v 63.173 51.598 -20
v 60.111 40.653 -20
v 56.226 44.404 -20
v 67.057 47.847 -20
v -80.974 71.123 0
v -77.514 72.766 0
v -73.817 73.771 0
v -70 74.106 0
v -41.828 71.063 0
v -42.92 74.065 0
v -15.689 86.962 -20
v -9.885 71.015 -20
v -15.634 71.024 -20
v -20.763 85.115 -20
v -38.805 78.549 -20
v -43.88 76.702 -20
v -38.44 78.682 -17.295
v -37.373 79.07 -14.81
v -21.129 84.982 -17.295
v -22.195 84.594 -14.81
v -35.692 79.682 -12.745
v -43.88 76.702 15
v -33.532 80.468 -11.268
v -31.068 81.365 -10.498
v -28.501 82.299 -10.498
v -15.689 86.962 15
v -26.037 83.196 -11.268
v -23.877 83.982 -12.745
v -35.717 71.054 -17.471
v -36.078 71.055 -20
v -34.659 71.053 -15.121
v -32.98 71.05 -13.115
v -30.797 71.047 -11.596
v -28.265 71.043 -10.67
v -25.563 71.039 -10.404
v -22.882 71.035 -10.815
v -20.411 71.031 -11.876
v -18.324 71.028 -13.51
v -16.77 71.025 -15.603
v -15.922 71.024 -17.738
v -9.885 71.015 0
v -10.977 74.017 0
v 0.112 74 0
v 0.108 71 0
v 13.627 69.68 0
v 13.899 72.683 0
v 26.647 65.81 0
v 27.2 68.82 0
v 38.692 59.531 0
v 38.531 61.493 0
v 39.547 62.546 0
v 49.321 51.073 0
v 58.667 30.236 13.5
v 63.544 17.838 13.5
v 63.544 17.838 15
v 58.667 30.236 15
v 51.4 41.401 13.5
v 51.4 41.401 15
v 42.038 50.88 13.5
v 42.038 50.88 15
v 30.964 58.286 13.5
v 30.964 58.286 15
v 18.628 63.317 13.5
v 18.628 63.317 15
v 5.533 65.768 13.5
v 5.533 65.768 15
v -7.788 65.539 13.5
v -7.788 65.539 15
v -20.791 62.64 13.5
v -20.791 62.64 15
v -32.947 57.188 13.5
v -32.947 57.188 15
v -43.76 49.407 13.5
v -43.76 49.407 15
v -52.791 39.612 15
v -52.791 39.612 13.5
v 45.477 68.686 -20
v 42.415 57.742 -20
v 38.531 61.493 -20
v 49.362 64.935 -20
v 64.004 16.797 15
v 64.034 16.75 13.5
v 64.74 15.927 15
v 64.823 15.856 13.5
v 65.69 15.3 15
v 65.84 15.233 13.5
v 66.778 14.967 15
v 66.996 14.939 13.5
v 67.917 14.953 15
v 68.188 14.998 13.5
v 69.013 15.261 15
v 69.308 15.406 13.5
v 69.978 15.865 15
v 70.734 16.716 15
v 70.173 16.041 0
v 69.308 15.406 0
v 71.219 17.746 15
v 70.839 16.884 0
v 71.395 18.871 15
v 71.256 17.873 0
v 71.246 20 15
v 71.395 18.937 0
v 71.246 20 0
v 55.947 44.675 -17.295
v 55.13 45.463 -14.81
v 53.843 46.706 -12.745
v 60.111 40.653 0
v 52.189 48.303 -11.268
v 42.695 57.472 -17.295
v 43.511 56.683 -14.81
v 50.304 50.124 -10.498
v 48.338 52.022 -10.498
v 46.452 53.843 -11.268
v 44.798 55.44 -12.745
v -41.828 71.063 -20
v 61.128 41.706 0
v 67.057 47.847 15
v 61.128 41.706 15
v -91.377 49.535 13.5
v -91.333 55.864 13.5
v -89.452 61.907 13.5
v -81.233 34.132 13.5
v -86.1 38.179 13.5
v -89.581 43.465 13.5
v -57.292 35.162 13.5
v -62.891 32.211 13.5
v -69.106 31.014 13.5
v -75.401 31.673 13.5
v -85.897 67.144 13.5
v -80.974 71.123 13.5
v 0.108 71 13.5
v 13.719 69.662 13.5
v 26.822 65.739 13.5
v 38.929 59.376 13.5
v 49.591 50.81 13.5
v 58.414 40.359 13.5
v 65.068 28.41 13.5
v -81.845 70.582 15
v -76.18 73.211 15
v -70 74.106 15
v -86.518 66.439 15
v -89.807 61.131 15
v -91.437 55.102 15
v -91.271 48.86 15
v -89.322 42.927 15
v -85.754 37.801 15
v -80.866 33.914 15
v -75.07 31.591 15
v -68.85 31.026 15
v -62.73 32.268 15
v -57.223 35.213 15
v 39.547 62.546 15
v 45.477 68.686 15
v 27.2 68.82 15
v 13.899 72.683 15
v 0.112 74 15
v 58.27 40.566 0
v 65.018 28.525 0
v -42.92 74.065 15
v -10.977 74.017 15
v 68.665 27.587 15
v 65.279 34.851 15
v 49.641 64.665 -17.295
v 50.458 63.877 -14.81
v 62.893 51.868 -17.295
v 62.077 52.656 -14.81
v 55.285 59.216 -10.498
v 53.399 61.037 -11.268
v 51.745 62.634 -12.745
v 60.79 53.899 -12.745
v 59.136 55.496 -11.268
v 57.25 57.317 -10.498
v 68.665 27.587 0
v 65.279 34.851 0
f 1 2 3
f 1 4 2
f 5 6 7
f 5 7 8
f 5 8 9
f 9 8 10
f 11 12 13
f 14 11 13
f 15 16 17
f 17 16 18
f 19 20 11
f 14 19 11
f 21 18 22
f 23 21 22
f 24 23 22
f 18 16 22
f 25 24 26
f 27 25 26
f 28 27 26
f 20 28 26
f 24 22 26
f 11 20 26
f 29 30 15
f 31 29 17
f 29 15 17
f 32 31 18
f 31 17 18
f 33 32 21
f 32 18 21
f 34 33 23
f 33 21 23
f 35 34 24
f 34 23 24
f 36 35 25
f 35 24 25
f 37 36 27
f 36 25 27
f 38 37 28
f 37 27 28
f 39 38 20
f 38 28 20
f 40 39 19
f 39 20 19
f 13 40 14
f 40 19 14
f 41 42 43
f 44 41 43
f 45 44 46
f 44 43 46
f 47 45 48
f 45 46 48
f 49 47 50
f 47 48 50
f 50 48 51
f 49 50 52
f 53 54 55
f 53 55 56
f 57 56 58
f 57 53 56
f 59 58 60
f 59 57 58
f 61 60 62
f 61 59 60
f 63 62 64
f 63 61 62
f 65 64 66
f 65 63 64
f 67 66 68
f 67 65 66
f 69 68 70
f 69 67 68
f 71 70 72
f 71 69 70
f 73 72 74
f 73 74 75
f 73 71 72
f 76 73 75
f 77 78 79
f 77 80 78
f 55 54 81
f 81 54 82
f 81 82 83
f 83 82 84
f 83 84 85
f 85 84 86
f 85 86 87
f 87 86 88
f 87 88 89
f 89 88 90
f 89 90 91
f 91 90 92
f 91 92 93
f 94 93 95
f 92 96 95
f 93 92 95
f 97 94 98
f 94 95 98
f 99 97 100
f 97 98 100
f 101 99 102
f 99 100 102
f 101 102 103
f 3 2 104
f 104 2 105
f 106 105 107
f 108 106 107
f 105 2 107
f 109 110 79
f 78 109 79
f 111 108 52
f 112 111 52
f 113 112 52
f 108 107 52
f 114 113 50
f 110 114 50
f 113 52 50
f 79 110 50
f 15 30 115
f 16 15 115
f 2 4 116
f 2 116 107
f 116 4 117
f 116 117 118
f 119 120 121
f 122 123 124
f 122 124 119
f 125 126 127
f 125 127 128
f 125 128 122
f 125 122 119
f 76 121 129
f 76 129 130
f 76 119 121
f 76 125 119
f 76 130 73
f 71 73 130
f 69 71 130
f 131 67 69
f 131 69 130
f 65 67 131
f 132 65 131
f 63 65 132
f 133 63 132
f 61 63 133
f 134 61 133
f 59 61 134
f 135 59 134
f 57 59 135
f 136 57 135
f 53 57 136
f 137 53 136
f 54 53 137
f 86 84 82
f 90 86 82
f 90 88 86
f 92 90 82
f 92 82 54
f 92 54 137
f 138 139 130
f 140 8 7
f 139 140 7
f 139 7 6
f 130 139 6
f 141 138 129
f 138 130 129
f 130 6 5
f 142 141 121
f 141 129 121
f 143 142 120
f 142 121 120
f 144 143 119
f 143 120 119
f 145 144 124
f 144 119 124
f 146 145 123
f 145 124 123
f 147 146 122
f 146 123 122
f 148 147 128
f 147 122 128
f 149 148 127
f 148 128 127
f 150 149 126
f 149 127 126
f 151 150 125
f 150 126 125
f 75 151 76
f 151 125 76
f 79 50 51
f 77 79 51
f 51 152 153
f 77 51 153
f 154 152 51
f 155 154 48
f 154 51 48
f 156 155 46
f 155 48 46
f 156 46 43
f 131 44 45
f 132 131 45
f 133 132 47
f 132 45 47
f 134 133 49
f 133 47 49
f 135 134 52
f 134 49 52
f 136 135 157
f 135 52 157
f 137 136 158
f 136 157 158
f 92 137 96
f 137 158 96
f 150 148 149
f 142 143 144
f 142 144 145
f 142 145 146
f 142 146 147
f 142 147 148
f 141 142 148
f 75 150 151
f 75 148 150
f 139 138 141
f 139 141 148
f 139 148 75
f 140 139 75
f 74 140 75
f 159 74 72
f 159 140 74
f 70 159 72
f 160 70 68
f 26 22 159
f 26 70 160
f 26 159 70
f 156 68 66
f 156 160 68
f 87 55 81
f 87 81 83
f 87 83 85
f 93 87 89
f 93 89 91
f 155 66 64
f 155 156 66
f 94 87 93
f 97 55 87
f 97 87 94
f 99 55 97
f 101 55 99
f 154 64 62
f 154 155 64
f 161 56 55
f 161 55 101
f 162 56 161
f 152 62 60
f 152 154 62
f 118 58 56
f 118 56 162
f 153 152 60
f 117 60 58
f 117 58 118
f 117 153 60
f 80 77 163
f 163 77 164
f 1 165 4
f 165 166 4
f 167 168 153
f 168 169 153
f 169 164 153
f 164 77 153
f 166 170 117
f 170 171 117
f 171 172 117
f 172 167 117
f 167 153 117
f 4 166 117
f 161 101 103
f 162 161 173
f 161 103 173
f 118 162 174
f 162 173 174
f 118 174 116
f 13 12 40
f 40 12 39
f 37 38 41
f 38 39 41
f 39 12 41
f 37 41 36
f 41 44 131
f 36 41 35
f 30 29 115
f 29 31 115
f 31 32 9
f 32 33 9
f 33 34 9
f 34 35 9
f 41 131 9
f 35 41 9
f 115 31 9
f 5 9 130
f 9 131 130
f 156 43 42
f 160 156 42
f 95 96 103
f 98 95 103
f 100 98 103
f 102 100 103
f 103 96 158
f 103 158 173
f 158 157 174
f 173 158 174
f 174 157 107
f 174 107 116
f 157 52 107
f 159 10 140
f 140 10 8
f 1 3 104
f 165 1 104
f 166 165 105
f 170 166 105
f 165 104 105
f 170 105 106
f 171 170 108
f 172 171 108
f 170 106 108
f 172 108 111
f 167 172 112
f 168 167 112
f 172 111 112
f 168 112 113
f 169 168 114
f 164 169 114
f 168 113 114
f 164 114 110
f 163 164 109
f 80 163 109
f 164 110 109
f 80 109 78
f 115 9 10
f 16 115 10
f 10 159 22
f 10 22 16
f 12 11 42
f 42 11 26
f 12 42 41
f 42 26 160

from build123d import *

# Parameters (mm, degrees)
PAD_DEPTH       = 15
SKETCH002_R     = 71
POCKET_DEPTH    = 13.5
POCKET001_DEPTH = 13.5
PAD001_DEPTH    = 35
PAD002_DEPTH    = 35
SKETCH_R        = 9.6
POCKET002_DEPTH = 41.1514534441
SKETCH009_R     = 9.6
POCKET003_DEPTH = 97.4839978397


with BuildPart() as part:
    # Sketch001 → Pad (new body)
    with BuildSketch(Plane.XY):
        with BuildLine():
            ThreePointArc((71.2460525222, 20), (44.7436533058, 58.9406946756), (0.1121090023, 73.9999150781))
            Line((0.1121090023, 73.9999150781), (-70, 74.1061334774))
            ThreePointArc((-69.9999999999, 74.1061334774), (-89.3215614177, 42.9266570301), (-52.7907882568, 39.6122793491))
            ThreePointArc((63.5437766663, 17.8378375087), (12.1424161228, 64.8734285413), (-52.7907882568, 39.6122793491))
            ThreePointArc((63.5437766663, 17.8378375087), (68.4759958054, 15.0677809492), (71.2460525222, 20))
        make_face()
    extrude(amount=PAD_DEPTH)

    # Sketch002 → Pocket (cut)
    with BuildSketch(Plane(origin=(0, 0, 0), x_dir=(1, 0, 0), z_dir=(0, 0, -1))):
        Circle(SKETCH002_R)
    extrude(amount=-POCKET_DEPTH, mode=Mode.SUBTRACT)

    # Sketch003 → Pocket001 (cut)
    with BuildSketch(Plane(origin=(0, 0, 0), x_dir=(1, 0, 0), z_dir=(0, 0, -1))):
        Polygon((-153.2491449427, -71.2322507725), (0.107679068, -70.9999183467), (-35.4631, 35.7409), align=None)
    extrude(amount=-POCKET001_DEPTH, mode=Mode.SUBTRACT)

    # Sketch005 → Pad001 (new body)
    with BuildSketch(Plane.XY.offset(15)):
        Polygon((38.5306472975, 61.493001381), (45.4772310021, 68.6863993843), (67.0574250122, 47.8466482706), (60.1108413076, 40.6532502672), align=None)
    extrude(amount=-PAD001_DEPTH)

    # Sketch006 → Pad002 (new body)
    with BuildSketch(Plane.XY.offset(15)):
        Polygon((-41.8276469497, 71.0634495008), (-43.8797678097, 76.7016052255), (-15.6889891861, 86.9622095253), (-9.8847001983, 71.0150565952), align=None)
    extrude(amount=-PAD002_DEPTH)

    # Sketch → Pocket002 (cut, through all)
    with BuildSketch(Plane(origin=(49.3207443026, 51.0731258241, 0), x_dir=(0.7193398003, -0.6946583705, 0), z_dir=(-0.6946583705, -0.7193398003, 0))):
        with Locations((0, -20)):
            Circle(SKETCH_R)
    extrude(amount=-POCKET002_DEPTH, mode=Mode.SUBTRACT)

    # Sketch009 → Pocket003 (cut, through all)
    with BuildSketch(Plane(origin=(-29.7843784979, 81.8319073754, 0), x_dir=(-0.9396926208, -0.3420201433, 0), z_dir=(-0.3420201433, 0.9396926208, 0))):
        with Locations((0, -20)):
            Circle(SKETCH009_R)
    extrude(amount=-POCKET003_DEPTH, mode=Mode.SUBTRACT)


solid = part.part
